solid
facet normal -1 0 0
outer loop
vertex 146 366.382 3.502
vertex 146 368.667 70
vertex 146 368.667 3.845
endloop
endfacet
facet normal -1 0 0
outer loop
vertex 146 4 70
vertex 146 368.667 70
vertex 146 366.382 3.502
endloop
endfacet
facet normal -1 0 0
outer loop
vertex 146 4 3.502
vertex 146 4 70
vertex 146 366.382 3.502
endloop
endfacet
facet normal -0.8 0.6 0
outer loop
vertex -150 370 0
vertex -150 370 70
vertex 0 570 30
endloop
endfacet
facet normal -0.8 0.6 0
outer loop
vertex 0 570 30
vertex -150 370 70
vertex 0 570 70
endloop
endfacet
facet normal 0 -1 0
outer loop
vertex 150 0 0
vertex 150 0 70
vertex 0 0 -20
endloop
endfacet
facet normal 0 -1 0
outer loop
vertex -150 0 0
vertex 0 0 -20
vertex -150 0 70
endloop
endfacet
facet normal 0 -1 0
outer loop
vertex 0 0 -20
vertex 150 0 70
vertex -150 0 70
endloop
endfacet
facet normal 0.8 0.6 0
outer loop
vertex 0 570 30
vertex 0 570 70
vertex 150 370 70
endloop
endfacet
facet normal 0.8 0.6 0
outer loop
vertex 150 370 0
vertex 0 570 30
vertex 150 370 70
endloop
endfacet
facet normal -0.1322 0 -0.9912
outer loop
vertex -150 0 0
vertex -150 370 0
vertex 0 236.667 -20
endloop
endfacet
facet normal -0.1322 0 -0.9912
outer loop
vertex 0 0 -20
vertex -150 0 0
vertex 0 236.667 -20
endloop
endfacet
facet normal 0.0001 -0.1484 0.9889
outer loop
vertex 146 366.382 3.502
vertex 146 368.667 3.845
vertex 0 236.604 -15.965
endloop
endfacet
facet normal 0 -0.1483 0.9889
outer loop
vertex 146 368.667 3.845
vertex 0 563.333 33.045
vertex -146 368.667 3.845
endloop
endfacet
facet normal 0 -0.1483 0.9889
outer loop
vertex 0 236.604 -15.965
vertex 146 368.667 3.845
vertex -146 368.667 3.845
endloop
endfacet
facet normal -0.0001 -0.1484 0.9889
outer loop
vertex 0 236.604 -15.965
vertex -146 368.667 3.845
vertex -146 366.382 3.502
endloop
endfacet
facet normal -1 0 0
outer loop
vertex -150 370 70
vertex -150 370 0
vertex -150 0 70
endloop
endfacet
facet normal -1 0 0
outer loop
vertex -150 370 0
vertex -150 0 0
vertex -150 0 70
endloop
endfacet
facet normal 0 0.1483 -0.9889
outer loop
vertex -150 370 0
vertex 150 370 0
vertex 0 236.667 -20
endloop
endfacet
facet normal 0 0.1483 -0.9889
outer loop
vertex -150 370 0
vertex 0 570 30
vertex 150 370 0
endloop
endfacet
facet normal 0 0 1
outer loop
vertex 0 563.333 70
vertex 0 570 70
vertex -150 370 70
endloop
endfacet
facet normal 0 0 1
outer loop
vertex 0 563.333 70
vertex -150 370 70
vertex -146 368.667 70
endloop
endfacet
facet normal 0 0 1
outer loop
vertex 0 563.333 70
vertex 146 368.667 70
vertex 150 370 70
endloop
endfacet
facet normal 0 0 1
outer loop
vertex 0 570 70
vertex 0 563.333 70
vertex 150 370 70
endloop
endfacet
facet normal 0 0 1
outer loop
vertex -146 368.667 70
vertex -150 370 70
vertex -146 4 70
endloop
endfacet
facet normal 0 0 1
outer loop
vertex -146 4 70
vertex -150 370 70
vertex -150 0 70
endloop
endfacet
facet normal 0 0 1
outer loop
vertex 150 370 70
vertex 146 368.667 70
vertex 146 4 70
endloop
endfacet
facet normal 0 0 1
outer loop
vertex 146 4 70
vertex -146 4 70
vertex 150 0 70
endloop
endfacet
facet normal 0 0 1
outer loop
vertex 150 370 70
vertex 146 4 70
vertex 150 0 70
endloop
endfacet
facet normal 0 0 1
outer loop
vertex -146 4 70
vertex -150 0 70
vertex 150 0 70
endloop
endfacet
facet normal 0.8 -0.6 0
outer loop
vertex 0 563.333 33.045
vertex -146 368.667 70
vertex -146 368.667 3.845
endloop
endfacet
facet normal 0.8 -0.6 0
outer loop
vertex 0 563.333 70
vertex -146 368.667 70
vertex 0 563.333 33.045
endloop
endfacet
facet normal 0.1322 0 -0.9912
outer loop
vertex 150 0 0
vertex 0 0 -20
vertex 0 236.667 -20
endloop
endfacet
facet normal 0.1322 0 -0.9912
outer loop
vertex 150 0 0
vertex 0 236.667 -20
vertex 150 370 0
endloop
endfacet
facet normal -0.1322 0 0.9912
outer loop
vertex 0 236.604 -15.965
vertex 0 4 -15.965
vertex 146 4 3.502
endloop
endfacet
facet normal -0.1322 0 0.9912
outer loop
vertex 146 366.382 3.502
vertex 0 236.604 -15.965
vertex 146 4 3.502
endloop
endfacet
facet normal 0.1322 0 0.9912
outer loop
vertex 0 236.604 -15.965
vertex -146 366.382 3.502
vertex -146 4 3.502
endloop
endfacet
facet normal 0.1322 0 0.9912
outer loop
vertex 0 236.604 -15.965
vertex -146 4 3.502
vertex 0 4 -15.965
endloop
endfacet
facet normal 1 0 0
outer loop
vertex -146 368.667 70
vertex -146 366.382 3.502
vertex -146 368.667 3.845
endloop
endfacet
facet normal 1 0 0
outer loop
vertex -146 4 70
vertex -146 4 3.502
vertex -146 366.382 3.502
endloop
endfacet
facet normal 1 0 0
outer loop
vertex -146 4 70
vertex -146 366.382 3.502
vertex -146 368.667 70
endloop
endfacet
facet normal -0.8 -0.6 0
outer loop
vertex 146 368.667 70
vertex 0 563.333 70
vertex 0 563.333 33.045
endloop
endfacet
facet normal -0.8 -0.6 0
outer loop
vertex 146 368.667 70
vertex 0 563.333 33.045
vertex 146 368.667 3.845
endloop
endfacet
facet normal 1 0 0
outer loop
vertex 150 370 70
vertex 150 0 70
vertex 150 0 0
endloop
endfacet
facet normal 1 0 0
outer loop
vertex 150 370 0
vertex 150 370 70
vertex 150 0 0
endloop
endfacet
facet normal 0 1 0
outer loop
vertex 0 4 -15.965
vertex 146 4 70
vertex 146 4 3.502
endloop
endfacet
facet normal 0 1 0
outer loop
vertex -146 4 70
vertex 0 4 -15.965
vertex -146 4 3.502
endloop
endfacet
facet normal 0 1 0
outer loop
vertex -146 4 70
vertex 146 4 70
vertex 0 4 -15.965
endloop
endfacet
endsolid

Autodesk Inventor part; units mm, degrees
ref_plane "YZ Plane" through (0, 0, 0) normal (1, 0, 0) x (0, 1, 0)
ref_plane "XZ Plane" through (0, 0, 0) normal (0, 1, 0) x (-1, 0, 0)
ref_plane "XY Plane" through (0, 0, 0) normal (0, 0, 1) x (1, 0, 0)
sketch "Sketch1" plane through (0, 0, 0) normal (0, 1, 0) x (-1, 0, 0)
  line L0 (150, 70) -> (-150, 70)
  line L1 (-150, 70) -> (-150, 0)
  line L2 (-150, 0) -> (150, 0)
  line L3 (150, 0) -> (150, 70)
  line L4 (150, 0) -> (0, -20)
  line L5 (0, -20) -> (-150, 0)
  point P0 (0, 0)
  point P1 (0, 0)
  dimension "d0" = 300
  dimension "d1" = 70
  dimension "d2" = 20
extrude "Extrusion1" add sketch "Sketch1" along normal blind 600
sketch "Sketch2" plane through (-150, 0, 70) normal (0, 0, 1) x (1, 0, 0)
  line L0 (0, 0) -> (300, 0) projected
  line L1 (300, 0) -> (300, 600) projected
  line L2 (0, 600) -> (300, 600) projected
  line L3 (0, 0) -> (0, 600) projected
  ellipse E0 centre (150, 370) end of major axis (0, 370) minor radius 200
  line L4 (0, 370) -> (150, 570)
  line L5 (150, 570) -> (300, 370)
  point P0 (150, 0)
  point P1 (150, 600)
  dimension "d7" = 200
  dimension "d5" = 370
extrude "Extrusion2" cut sketch "Sketch2" against normal through all contours L3 L2 L1 E0 | E0 L4 | L5 E0
sketch "Sketch3" plane through (-150, 0, 0) normal (-1, 0, 0) x (0, 0, 1)
  line L0 (70, 570) -> (-20, 570) projected
  line L1 (-20, 0) -> (-20, 570) projected
  line L2 (30, 570) -> (-20, 236.6667)
  point P0 (0, 0)
  point P1 (0, 370)
  dimension "d11" = 40
extrude "Extrusion3" cut sketch "Sketch3" against normal through all
shell "Shell2" thickness 4 removed faces 1 at (50, 246.6667, 70)
properties part number "Generalcraftshape1"
